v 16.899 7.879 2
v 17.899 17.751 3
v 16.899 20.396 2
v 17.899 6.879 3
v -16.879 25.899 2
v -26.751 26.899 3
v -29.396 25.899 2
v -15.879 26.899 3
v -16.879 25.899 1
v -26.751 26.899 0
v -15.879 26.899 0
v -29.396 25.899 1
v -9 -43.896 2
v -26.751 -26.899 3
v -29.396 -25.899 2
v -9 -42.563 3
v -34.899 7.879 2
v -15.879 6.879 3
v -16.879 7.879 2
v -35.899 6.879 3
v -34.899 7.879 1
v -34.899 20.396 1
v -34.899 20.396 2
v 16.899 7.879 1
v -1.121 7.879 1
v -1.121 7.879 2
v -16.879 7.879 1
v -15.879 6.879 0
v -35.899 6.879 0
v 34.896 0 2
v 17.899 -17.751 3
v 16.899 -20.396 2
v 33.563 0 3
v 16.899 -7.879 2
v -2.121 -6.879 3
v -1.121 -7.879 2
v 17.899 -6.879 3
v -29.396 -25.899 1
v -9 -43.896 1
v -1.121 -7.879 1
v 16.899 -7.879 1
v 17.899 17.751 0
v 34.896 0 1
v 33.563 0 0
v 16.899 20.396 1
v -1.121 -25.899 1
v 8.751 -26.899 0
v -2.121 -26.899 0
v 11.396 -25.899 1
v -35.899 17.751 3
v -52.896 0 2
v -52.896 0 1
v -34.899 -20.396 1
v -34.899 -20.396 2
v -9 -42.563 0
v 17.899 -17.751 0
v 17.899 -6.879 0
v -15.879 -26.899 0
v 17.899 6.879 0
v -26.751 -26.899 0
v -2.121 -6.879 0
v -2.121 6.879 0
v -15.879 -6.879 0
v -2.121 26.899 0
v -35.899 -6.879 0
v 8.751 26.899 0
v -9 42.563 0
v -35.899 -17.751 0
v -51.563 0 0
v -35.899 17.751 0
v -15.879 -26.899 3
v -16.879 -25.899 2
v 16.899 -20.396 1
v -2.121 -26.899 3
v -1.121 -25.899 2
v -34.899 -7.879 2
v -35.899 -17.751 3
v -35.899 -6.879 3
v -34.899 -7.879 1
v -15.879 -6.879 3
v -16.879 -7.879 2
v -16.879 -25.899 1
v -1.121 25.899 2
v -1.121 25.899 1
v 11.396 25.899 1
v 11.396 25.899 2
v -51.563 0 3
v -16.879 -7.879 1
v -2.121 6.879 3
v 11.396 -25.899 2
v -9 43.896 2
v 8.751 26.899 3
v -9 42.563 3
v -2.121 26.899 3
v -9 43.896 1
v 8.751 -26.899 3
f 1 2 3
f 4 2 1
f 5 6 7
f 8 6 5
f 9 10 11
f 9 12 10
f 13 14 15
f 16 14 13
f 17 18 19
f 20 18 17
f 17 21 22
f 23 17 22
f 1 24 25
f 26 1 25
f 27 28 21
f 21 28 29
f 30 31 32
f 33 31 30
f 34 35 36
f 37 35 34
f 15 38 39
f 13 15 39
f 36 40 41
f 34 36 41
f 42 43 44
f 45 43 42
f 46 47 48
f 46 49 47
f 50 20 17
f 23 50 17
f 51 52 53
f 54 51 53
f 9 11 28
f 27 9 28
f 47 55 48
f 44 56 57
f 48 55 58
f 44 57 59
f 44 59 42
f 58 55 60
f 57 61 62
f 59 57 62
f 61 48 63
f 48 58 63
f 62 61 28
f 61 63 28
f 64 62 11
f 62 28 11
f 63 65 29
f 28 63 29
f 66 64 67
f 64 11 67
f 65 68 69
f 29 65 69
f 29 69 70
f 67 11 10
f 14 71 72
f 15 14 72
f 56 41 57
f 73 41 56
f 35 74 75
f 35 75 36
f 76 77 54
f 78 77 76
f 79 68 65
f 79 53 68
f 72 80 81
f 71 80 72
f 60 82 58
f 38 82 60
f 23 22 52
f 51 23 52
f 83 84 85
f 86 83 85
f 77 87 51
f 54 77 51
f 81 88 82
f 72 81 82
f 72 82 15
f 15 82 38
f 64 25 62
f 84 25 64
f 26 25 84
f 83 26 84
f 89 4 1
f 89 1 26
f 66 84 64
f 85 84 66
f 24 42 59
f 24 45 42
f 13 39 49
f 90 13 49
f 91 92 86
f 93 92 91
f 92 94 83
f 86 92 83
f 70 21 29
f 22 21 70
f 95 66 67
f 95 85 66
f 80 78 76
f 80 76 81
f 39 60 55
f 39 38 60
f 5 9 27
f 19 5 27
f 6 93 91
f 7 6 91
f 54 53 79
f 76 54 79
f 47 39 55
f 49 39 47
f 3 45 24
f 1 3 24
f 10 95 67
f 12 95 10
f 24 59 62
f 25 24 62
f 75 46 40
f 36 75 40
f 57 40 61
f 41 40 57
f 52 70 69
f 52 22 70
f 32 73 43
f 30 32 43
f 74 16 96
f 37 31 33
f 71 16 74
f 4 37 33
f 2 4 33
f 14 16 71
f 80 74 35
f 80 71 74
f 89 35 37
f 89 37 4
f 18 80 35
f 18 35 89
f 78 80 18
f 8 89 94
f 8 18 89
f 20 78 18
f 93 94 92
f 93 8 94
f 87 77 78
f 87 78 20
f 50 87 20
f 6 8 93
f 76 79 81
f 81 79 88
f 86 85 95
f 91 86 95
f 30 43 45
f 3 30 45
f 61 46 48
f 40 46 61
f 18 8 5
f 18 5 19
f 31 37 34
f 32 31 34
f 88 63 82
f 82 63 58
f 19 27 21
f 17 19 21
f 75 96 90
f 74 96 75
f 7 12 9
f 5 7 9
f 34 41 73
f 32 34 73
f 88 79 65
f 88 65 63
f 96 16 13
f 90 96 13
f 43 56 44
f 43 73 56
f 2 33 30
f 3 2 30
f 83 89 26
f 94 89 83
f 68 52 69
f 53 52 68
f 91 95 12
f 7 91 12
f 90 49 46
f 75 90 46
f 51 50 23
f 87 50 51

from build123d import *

# Parameters (mm, degrees)
PAD_DEPTH                = 3
CHAMFER_SIZE             = 1
CHAMFER001_SIZE          = 1
BODY001_PLACEMENT_ANGLE  = 90
CLONE001_PLACEMENT_ANGLE = 90
BODY002_PLACEMENT_ANGLE  = 270
CLONE002_PLACEMENT_ANGLE = 270
BODY003_PLACEMENT_ANGLE  = 180


with BuildPart() as body:
    # Sketch → Pad (new body)
    with BuildSketch(Plane.XY):
        Polygon((-16.899492, 7.879108), (-16.899492, -7.879108), (16.899492, -7.879108), (16.899492, -20.39575), (34.896271, 0), (16.899492, 20.39575), (16.899492, 7.879108), align=None)
    extrude(amount=PAD_DEPTH)

    # Chamfer
    chamfer_edges = [body.edges().sort_by_distance(p)[0] for p in [
        (-16.899492, 0, 3),
        (0, -7.879108, 3),
        (16.899492, -14.137429, 3),
        (25.897881, -10.197875, 3),
        (25.897881, 10.197875, 3),
        (16.899492, 14.137429, 3),
        (0, 7.879108, 3),
    ]]
    chamfer(chamfer_edges, length=CHAMFER_SIZE)

    # Chamfer001
    chamfer001_edges = [body.edges().sort_by_distance(p)[0] for p in [
        (-16.899492, 0, 0),
        (0, -7.879108, 0),
        (16.899492, -14.137429, 0),
        (25.897881, -10.197875, 0),
        (25.897881, 10.197875, 0),
        (16.899492, 14.137429, 0),
        (0, 7.879108, 0),
    ]]
    chamfer(chamfer001_edges, length=CHAMFER001_SIZE)


with BuildPart() as body001:
    # Body001 base: copy of Body
    add(body.part)


with BuildPart() as body001_1:
    # Body001 placement: moved
    add(body001.part.moved(Location((-9, 9, 0))).rotate(Axis((-9, 9, 0), (0, 0, 1)), BODY001_PLACEMENT_ANGLE))


with BuildPart() as body002:
    # Body002 base: copy of Body001
    add(body001_1.part)


with BuildPart() as body002_1:
    # Clone001 placement: moved
    add(body002.part.moved(Location((-9, -9, 0))).rotate(Axis((-9, -9, 0), (0, 0, -1)), CLONE001_PLACEMENT_ANGLE))


with BuildPart() as body002_2:
    # Body002 placement: moved
    add(body002_1.part.moved(Location((-9, -9, 0))).rotate(Axis((-9, -9, 0), (0, 0, 1)), BODY002_PLACEMENT_ANGLE))


with BuildPart() as body003:
    # Body003 base: copy of Body002
    add(body002_2.part)


with BuildPart() as body003_1:
    # Clone002 placement: moved
    add(body003.part.moved(Location((-9, 9, 0))).rotate(Axis((-9, 9, 0), (0, 0, -1)), CLONE002_PLACEMENT_ANGLE))


with BuildPart() as body003_2:
    # Body003 placement: moved
    add(body003_1.part.moved(Location((-18, 0, 0))).rotate(Axis((-18, 0, 0), (0, 0, 1)), BODY003_PLACEMENT_ANGLE))


with BuildPart() as fusion:
    # Fusion base: copy of Body
    add(body.part)

    # Fusion: union Body001, Body002, Body003
    add(body001_1.part)
    add(body002_2.part)
    add(body003_2.part)


solid = fusion.part
